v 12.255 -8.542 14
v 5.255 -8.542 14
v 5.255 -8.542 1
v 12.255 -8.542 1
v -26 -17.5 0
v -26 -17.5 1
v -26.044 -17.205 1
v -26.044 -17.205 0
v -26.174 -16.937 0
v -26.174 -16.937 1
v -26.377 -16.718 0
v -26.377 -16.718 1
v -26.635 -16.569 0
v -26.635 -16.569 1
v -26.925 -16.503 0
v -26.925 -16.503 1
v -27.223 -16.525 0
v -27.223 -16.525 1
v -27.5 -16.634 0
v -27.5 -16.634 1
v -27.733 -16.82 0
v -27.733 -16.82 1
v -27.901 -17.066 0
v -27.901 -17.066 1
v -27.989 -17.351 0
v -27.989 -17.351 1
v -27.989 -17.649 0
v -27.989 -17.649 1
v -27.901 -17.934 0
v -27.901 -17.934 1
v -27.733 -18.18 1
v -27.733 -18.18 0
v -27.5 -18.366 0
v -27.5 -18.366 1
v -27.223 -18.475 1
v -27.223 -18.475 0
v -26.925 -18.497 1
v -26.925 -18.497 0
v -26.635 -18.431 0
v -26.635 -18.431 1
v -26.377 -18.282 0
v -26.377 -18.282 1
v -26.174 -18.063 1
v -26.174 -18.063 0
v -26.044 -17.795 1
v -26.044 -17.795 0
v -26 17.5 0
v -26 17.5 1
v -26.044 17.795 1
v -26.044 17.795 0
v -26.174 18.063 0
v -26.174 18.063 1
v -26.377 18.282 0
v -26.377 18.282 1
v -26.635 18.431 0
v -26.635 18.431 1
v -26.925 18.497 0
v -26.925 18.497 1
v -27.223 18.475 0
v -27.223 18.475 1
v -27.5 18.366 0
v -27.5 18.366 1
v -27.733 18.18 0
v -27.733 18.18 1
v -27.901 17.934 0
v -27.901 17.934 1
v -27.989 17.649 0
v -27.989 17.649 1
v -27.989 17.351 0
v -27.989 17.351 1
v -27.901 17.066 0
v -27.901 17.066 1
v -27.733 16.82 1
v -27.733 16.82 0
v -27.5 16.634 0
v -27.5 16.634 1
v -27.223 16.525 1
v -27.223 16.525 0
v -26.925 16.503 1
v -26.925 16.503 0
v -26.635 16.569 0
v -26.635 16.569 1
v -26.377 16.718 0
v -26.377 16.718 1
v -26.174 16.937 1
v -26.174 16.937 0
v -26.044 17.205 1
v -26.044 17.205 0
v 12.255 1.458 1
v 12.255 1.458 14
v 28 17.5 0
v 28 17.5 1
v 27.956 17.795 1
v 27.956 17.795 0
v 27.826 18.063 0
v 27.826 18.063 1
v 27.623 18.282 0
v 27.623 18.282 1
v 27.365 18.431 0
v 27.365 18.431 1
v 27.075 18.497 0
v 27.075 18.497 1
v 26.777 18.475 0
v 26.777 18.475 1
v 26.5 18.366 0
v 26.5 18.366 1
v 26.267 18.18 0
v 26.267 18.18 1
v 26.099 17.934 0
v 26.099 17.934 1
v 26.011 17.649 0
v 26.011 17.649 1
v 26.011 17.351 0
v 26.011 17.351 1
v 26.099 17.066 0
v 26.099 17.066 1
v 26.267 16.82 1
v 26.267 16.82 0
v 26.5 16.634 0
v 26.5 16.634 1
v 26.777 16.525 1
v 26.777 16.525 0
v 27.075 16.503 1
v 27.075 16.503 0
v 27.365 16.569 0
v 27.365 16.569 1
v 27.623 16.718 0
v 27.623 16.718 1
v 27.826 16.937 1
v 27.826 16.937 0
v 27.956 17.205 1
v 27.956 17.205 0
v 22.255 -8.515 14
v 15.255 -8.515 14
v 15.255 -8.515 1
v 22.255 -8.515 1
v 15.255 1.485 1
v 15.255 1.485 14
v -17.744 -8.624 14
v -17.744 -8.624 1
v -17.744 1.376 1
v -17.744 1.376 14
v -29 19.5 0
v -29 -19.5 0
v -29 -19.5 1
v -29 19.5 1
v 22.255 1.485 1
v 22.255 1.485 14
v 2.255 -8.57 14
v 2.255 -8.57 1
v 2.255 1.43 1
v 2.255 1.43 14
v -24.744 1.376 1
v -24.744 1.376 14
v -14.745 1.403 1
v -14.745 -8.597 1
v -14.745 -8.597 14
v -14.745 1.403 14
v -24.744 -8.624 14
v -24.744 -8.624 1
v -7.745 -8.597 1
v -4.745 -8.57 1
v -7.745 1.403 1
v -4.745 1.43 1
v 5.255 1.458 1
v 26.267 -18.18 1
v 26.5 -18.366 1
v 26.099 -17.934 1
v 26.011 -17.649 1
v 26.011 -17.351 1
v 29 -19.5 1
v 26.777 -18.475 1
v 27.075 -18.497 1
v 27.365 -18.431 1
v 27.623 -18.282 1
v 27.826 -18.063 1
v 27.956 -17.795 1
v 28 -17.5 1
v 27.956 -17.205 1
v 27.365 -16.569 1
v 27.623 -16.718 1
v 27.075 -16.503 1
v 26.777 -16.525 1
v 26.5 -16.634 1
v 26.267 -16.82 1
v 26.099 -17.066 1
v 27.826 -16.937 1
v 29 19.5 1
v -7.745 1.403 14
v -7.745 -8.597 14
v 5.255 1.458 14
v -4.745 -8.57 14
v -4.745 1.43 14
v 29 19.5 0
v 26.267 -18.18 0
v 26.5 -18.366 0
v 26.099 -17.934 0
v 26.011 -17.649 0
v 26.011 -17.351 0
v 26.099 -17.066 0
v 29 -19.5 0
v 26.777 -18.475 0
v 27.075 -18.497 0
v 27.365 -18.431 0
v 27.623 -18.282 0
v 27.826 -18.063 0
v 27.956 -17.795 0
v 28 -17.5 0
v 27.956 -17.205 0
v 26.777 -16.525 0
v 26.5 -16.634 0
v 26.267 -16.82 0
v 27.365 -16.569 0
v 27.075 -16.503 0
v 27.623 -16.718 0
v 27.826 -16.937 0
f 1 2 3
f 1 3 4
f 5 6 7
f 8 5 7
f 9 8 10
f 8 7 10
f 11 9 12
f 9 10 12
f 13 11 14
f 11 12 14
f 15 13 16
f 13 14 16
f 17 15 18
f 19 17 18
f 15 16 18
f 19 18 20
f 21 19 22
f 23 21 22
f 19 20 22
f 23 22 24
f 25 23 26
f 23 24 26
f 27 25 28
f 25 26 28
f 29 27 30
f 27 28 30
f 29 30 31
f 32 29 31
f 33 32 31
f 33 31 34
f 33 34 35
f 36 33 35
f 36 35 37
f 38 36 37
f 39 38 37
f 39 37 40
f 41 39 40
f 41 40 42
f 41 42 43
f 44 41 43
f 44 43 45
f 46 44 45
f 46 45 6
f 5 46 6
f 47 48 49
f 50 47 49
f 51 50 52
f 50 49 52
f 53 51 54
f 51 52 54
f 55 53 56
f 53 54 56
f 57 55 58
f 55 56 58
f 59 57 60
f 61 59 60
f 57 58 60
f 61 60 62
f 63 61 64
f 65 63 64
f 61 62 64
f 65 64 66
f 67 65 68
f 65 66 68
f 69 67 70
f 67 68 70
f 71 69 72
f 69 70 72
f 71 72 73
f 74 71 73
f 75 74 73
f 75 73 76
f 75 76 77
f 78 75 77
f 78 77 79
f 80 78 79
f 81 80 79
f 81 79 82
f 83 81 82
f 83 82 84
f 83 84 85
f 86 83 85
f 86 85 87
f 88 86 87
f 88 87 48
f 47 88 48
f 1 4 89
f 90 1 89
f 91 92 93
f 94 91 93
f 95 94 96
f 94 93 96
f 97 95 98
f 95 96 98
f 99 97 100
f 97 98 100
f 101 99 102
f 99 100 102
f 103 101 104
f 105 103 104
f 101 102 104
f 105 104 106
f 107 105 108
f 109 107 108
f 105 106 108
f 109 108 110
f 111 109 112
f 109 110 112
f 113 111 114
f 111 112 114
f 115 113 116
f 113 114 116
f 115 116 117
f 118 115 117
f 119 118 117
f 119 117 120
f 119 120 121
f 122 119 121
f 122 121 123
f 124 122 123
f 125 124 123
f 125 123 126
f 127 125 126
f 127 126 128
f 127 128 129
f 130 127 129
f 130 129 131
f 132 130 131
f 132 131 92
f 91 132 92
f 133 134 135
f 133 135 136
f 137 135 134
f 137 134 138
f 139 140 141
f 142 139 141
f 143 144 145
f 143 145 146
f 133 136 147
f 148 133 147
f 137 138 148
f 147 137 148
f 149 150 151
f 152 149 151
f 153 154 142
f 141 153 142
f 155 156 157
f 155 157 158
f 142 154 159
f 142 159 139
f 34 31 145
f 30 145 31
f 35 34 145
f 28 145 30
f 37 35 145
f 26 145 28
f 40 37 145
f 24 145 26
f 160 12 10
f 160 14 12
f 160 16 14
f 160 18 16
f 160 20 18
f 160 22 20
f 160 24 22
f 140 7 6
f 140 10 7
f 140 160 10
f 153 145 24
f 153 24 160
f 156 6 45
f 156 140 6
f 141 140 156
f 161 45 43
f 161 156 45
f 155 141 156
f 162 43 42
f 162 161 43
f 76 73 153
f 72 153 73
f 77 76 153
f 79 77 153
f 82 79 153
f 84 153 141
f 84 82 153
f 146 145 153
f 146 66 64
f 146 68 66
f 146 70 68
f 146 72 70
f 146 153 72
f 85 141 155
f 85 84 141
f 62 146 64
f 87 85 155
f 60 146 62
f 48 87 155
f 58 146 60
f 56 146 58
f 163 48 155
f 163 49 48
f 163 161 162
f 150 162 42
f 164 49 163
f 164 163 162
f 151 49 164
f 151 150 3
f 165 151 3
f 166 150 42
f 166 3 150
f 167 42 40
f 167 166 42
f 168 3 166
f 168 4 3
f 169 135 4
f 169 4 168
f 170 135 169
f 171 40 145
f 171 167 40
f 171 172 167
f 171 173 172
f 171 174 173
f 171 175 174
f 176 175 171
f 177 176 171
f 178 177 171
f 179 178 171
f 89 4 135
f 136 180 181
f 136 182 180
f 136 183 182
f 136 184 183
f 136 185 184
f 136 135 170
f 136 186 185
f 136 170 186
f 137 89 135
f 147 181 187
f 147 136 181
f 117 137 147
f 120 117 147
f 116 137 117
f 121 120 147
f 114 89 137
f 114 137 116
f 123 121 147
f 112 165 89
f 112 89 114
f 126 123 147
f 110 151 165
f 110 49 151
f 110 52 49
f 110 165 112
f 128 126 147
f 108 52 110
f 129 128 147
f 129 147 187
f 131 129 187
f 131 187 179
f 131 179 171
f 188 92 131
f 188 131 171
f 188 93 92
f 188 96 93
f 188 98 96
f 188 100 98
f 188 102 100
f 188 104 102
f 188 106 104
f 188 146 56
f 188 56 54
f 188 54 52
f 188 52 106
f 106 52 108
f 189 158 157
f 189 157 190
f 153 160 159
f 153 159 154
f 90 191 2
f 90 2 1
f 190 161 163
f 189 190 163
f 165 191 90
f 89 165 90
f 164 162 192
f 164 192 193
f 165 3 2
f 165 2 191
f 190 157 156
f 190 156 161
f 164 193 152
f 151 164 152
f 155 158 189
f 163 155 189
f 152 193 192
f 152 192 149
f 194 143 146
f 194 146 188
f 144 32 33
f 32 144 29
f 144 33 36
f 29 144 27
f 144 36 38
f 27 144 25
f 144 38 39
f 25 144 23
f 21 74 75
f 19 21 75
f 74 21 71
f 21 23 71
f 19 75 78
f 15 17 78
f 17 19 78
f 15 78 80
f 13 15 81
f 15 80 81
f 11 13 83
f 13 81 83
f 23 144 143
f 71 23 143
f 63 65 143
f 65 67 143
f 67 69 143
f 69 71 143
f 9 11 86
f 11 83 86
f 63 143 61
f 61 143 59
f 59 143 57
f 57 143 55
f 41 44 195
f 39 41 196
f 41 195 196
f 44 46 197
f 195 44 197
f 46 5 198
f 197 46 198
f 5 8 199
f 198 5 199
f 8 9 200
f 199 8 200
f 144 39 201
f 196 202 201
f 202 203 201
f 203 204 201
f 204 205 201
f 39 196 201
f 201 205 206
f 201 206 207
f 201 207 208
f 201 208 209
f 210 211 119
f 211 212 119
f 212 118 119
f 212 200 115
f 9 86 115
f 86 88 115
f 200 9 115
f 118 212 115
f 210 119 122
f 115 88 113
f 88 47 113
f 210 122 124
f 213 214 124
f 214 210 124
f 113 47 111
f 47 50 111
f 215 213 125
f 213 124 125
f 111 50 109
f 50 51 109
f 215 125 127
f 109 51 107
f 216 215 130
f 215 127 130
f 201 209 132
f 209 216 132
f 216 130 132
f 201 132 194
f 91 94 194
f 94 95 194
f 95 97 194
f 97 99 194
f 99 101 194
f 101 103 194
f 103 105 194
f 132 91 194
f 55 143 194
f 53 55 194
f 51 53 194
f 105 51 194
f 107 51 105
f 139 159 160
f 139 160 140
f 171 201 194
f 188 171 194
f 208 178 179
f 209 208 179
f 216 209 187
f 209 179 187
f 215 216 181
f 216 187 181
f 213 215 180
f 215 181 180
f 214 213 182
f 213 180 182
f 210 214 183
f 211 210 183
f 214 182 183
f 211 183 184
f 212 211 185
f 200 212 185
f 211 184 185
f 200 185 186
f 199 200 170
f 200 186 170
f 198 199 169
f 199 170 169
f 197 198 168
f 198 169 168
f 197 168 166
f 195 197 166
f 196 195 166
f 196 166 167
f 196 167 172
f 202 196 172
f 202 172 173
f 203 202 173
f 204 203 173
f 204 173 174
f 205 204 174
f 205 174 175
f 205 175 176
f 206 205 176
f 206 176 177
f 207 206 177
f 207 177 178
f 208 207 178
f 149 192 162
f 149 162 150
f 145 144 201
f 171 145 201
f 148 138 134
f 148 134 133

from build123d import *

# Parameters (mm, degrees)
F0_W     = 58
F0_H     = 39
F1_DEPTH = 14
F2_W     = 58
F2_H     = 39
F2_W_2   = 7
F2_H_2   = 10
F3_DEPTH = 13
F4_R     = 1
F5_DEPTH = 25


with BuildPart() as f1:
    # F0 (on Top) → F1 (new body)
    with BuildSketch(Plane.XY):
        Rectangle(F0_W, F0_H)
    extrude(amount=F1_DEPTH)

    # F2 (on face) → F3 (cut)
    with BuildSketch(Plane.XY.offset(14)):
        Rectangle(F2_W, F2_H)
        with Locations((-21.244489, -3.62447)):
            Rectangle(F2_W_2, F2_H_2, mode=Mode.SUBTRACT)
        with Locations((-11.244526, -3.597112)):
            Rectangle(F2_W_2, F2_H_2, mode=Mode.SUBTRACT)
        with Locations((-1.244564, -3.569755)):
            Rectangle(F2_W_2, F2_H_2, mode=Mode.SUBTRACT)
        with Locations((8.755399, -3.542397)):
            Rectangle(F2_W_2, F2_H_2, mode=Mode.SUBTRACT)
        with Locations((18.755362, -3.515039)):
            Rectangle(F2_W_2, F2_H_2, mode=Mode.SUBTRACT)
    extrude(amount=-F3_DEPTH, mode=Mode.SUBTRACT)

    # F4 (on face) → F5 (cut)
    with BuildSketch(Plane.XY.offset(1)):
        with Locations((-27, 17.5)):
            Circle(F4_R)
        with Locations((-27, -17.5)):
            Circle(F4_R)
        with Locations((27, -17.5)):
            Circle(F4_R)
        with Locations((27, 17.5)):
            Circle(F4_R)
    extrude(amount=-F5_DEPTH, mode=Mode.SUBTRACT)


solid = f1.part
